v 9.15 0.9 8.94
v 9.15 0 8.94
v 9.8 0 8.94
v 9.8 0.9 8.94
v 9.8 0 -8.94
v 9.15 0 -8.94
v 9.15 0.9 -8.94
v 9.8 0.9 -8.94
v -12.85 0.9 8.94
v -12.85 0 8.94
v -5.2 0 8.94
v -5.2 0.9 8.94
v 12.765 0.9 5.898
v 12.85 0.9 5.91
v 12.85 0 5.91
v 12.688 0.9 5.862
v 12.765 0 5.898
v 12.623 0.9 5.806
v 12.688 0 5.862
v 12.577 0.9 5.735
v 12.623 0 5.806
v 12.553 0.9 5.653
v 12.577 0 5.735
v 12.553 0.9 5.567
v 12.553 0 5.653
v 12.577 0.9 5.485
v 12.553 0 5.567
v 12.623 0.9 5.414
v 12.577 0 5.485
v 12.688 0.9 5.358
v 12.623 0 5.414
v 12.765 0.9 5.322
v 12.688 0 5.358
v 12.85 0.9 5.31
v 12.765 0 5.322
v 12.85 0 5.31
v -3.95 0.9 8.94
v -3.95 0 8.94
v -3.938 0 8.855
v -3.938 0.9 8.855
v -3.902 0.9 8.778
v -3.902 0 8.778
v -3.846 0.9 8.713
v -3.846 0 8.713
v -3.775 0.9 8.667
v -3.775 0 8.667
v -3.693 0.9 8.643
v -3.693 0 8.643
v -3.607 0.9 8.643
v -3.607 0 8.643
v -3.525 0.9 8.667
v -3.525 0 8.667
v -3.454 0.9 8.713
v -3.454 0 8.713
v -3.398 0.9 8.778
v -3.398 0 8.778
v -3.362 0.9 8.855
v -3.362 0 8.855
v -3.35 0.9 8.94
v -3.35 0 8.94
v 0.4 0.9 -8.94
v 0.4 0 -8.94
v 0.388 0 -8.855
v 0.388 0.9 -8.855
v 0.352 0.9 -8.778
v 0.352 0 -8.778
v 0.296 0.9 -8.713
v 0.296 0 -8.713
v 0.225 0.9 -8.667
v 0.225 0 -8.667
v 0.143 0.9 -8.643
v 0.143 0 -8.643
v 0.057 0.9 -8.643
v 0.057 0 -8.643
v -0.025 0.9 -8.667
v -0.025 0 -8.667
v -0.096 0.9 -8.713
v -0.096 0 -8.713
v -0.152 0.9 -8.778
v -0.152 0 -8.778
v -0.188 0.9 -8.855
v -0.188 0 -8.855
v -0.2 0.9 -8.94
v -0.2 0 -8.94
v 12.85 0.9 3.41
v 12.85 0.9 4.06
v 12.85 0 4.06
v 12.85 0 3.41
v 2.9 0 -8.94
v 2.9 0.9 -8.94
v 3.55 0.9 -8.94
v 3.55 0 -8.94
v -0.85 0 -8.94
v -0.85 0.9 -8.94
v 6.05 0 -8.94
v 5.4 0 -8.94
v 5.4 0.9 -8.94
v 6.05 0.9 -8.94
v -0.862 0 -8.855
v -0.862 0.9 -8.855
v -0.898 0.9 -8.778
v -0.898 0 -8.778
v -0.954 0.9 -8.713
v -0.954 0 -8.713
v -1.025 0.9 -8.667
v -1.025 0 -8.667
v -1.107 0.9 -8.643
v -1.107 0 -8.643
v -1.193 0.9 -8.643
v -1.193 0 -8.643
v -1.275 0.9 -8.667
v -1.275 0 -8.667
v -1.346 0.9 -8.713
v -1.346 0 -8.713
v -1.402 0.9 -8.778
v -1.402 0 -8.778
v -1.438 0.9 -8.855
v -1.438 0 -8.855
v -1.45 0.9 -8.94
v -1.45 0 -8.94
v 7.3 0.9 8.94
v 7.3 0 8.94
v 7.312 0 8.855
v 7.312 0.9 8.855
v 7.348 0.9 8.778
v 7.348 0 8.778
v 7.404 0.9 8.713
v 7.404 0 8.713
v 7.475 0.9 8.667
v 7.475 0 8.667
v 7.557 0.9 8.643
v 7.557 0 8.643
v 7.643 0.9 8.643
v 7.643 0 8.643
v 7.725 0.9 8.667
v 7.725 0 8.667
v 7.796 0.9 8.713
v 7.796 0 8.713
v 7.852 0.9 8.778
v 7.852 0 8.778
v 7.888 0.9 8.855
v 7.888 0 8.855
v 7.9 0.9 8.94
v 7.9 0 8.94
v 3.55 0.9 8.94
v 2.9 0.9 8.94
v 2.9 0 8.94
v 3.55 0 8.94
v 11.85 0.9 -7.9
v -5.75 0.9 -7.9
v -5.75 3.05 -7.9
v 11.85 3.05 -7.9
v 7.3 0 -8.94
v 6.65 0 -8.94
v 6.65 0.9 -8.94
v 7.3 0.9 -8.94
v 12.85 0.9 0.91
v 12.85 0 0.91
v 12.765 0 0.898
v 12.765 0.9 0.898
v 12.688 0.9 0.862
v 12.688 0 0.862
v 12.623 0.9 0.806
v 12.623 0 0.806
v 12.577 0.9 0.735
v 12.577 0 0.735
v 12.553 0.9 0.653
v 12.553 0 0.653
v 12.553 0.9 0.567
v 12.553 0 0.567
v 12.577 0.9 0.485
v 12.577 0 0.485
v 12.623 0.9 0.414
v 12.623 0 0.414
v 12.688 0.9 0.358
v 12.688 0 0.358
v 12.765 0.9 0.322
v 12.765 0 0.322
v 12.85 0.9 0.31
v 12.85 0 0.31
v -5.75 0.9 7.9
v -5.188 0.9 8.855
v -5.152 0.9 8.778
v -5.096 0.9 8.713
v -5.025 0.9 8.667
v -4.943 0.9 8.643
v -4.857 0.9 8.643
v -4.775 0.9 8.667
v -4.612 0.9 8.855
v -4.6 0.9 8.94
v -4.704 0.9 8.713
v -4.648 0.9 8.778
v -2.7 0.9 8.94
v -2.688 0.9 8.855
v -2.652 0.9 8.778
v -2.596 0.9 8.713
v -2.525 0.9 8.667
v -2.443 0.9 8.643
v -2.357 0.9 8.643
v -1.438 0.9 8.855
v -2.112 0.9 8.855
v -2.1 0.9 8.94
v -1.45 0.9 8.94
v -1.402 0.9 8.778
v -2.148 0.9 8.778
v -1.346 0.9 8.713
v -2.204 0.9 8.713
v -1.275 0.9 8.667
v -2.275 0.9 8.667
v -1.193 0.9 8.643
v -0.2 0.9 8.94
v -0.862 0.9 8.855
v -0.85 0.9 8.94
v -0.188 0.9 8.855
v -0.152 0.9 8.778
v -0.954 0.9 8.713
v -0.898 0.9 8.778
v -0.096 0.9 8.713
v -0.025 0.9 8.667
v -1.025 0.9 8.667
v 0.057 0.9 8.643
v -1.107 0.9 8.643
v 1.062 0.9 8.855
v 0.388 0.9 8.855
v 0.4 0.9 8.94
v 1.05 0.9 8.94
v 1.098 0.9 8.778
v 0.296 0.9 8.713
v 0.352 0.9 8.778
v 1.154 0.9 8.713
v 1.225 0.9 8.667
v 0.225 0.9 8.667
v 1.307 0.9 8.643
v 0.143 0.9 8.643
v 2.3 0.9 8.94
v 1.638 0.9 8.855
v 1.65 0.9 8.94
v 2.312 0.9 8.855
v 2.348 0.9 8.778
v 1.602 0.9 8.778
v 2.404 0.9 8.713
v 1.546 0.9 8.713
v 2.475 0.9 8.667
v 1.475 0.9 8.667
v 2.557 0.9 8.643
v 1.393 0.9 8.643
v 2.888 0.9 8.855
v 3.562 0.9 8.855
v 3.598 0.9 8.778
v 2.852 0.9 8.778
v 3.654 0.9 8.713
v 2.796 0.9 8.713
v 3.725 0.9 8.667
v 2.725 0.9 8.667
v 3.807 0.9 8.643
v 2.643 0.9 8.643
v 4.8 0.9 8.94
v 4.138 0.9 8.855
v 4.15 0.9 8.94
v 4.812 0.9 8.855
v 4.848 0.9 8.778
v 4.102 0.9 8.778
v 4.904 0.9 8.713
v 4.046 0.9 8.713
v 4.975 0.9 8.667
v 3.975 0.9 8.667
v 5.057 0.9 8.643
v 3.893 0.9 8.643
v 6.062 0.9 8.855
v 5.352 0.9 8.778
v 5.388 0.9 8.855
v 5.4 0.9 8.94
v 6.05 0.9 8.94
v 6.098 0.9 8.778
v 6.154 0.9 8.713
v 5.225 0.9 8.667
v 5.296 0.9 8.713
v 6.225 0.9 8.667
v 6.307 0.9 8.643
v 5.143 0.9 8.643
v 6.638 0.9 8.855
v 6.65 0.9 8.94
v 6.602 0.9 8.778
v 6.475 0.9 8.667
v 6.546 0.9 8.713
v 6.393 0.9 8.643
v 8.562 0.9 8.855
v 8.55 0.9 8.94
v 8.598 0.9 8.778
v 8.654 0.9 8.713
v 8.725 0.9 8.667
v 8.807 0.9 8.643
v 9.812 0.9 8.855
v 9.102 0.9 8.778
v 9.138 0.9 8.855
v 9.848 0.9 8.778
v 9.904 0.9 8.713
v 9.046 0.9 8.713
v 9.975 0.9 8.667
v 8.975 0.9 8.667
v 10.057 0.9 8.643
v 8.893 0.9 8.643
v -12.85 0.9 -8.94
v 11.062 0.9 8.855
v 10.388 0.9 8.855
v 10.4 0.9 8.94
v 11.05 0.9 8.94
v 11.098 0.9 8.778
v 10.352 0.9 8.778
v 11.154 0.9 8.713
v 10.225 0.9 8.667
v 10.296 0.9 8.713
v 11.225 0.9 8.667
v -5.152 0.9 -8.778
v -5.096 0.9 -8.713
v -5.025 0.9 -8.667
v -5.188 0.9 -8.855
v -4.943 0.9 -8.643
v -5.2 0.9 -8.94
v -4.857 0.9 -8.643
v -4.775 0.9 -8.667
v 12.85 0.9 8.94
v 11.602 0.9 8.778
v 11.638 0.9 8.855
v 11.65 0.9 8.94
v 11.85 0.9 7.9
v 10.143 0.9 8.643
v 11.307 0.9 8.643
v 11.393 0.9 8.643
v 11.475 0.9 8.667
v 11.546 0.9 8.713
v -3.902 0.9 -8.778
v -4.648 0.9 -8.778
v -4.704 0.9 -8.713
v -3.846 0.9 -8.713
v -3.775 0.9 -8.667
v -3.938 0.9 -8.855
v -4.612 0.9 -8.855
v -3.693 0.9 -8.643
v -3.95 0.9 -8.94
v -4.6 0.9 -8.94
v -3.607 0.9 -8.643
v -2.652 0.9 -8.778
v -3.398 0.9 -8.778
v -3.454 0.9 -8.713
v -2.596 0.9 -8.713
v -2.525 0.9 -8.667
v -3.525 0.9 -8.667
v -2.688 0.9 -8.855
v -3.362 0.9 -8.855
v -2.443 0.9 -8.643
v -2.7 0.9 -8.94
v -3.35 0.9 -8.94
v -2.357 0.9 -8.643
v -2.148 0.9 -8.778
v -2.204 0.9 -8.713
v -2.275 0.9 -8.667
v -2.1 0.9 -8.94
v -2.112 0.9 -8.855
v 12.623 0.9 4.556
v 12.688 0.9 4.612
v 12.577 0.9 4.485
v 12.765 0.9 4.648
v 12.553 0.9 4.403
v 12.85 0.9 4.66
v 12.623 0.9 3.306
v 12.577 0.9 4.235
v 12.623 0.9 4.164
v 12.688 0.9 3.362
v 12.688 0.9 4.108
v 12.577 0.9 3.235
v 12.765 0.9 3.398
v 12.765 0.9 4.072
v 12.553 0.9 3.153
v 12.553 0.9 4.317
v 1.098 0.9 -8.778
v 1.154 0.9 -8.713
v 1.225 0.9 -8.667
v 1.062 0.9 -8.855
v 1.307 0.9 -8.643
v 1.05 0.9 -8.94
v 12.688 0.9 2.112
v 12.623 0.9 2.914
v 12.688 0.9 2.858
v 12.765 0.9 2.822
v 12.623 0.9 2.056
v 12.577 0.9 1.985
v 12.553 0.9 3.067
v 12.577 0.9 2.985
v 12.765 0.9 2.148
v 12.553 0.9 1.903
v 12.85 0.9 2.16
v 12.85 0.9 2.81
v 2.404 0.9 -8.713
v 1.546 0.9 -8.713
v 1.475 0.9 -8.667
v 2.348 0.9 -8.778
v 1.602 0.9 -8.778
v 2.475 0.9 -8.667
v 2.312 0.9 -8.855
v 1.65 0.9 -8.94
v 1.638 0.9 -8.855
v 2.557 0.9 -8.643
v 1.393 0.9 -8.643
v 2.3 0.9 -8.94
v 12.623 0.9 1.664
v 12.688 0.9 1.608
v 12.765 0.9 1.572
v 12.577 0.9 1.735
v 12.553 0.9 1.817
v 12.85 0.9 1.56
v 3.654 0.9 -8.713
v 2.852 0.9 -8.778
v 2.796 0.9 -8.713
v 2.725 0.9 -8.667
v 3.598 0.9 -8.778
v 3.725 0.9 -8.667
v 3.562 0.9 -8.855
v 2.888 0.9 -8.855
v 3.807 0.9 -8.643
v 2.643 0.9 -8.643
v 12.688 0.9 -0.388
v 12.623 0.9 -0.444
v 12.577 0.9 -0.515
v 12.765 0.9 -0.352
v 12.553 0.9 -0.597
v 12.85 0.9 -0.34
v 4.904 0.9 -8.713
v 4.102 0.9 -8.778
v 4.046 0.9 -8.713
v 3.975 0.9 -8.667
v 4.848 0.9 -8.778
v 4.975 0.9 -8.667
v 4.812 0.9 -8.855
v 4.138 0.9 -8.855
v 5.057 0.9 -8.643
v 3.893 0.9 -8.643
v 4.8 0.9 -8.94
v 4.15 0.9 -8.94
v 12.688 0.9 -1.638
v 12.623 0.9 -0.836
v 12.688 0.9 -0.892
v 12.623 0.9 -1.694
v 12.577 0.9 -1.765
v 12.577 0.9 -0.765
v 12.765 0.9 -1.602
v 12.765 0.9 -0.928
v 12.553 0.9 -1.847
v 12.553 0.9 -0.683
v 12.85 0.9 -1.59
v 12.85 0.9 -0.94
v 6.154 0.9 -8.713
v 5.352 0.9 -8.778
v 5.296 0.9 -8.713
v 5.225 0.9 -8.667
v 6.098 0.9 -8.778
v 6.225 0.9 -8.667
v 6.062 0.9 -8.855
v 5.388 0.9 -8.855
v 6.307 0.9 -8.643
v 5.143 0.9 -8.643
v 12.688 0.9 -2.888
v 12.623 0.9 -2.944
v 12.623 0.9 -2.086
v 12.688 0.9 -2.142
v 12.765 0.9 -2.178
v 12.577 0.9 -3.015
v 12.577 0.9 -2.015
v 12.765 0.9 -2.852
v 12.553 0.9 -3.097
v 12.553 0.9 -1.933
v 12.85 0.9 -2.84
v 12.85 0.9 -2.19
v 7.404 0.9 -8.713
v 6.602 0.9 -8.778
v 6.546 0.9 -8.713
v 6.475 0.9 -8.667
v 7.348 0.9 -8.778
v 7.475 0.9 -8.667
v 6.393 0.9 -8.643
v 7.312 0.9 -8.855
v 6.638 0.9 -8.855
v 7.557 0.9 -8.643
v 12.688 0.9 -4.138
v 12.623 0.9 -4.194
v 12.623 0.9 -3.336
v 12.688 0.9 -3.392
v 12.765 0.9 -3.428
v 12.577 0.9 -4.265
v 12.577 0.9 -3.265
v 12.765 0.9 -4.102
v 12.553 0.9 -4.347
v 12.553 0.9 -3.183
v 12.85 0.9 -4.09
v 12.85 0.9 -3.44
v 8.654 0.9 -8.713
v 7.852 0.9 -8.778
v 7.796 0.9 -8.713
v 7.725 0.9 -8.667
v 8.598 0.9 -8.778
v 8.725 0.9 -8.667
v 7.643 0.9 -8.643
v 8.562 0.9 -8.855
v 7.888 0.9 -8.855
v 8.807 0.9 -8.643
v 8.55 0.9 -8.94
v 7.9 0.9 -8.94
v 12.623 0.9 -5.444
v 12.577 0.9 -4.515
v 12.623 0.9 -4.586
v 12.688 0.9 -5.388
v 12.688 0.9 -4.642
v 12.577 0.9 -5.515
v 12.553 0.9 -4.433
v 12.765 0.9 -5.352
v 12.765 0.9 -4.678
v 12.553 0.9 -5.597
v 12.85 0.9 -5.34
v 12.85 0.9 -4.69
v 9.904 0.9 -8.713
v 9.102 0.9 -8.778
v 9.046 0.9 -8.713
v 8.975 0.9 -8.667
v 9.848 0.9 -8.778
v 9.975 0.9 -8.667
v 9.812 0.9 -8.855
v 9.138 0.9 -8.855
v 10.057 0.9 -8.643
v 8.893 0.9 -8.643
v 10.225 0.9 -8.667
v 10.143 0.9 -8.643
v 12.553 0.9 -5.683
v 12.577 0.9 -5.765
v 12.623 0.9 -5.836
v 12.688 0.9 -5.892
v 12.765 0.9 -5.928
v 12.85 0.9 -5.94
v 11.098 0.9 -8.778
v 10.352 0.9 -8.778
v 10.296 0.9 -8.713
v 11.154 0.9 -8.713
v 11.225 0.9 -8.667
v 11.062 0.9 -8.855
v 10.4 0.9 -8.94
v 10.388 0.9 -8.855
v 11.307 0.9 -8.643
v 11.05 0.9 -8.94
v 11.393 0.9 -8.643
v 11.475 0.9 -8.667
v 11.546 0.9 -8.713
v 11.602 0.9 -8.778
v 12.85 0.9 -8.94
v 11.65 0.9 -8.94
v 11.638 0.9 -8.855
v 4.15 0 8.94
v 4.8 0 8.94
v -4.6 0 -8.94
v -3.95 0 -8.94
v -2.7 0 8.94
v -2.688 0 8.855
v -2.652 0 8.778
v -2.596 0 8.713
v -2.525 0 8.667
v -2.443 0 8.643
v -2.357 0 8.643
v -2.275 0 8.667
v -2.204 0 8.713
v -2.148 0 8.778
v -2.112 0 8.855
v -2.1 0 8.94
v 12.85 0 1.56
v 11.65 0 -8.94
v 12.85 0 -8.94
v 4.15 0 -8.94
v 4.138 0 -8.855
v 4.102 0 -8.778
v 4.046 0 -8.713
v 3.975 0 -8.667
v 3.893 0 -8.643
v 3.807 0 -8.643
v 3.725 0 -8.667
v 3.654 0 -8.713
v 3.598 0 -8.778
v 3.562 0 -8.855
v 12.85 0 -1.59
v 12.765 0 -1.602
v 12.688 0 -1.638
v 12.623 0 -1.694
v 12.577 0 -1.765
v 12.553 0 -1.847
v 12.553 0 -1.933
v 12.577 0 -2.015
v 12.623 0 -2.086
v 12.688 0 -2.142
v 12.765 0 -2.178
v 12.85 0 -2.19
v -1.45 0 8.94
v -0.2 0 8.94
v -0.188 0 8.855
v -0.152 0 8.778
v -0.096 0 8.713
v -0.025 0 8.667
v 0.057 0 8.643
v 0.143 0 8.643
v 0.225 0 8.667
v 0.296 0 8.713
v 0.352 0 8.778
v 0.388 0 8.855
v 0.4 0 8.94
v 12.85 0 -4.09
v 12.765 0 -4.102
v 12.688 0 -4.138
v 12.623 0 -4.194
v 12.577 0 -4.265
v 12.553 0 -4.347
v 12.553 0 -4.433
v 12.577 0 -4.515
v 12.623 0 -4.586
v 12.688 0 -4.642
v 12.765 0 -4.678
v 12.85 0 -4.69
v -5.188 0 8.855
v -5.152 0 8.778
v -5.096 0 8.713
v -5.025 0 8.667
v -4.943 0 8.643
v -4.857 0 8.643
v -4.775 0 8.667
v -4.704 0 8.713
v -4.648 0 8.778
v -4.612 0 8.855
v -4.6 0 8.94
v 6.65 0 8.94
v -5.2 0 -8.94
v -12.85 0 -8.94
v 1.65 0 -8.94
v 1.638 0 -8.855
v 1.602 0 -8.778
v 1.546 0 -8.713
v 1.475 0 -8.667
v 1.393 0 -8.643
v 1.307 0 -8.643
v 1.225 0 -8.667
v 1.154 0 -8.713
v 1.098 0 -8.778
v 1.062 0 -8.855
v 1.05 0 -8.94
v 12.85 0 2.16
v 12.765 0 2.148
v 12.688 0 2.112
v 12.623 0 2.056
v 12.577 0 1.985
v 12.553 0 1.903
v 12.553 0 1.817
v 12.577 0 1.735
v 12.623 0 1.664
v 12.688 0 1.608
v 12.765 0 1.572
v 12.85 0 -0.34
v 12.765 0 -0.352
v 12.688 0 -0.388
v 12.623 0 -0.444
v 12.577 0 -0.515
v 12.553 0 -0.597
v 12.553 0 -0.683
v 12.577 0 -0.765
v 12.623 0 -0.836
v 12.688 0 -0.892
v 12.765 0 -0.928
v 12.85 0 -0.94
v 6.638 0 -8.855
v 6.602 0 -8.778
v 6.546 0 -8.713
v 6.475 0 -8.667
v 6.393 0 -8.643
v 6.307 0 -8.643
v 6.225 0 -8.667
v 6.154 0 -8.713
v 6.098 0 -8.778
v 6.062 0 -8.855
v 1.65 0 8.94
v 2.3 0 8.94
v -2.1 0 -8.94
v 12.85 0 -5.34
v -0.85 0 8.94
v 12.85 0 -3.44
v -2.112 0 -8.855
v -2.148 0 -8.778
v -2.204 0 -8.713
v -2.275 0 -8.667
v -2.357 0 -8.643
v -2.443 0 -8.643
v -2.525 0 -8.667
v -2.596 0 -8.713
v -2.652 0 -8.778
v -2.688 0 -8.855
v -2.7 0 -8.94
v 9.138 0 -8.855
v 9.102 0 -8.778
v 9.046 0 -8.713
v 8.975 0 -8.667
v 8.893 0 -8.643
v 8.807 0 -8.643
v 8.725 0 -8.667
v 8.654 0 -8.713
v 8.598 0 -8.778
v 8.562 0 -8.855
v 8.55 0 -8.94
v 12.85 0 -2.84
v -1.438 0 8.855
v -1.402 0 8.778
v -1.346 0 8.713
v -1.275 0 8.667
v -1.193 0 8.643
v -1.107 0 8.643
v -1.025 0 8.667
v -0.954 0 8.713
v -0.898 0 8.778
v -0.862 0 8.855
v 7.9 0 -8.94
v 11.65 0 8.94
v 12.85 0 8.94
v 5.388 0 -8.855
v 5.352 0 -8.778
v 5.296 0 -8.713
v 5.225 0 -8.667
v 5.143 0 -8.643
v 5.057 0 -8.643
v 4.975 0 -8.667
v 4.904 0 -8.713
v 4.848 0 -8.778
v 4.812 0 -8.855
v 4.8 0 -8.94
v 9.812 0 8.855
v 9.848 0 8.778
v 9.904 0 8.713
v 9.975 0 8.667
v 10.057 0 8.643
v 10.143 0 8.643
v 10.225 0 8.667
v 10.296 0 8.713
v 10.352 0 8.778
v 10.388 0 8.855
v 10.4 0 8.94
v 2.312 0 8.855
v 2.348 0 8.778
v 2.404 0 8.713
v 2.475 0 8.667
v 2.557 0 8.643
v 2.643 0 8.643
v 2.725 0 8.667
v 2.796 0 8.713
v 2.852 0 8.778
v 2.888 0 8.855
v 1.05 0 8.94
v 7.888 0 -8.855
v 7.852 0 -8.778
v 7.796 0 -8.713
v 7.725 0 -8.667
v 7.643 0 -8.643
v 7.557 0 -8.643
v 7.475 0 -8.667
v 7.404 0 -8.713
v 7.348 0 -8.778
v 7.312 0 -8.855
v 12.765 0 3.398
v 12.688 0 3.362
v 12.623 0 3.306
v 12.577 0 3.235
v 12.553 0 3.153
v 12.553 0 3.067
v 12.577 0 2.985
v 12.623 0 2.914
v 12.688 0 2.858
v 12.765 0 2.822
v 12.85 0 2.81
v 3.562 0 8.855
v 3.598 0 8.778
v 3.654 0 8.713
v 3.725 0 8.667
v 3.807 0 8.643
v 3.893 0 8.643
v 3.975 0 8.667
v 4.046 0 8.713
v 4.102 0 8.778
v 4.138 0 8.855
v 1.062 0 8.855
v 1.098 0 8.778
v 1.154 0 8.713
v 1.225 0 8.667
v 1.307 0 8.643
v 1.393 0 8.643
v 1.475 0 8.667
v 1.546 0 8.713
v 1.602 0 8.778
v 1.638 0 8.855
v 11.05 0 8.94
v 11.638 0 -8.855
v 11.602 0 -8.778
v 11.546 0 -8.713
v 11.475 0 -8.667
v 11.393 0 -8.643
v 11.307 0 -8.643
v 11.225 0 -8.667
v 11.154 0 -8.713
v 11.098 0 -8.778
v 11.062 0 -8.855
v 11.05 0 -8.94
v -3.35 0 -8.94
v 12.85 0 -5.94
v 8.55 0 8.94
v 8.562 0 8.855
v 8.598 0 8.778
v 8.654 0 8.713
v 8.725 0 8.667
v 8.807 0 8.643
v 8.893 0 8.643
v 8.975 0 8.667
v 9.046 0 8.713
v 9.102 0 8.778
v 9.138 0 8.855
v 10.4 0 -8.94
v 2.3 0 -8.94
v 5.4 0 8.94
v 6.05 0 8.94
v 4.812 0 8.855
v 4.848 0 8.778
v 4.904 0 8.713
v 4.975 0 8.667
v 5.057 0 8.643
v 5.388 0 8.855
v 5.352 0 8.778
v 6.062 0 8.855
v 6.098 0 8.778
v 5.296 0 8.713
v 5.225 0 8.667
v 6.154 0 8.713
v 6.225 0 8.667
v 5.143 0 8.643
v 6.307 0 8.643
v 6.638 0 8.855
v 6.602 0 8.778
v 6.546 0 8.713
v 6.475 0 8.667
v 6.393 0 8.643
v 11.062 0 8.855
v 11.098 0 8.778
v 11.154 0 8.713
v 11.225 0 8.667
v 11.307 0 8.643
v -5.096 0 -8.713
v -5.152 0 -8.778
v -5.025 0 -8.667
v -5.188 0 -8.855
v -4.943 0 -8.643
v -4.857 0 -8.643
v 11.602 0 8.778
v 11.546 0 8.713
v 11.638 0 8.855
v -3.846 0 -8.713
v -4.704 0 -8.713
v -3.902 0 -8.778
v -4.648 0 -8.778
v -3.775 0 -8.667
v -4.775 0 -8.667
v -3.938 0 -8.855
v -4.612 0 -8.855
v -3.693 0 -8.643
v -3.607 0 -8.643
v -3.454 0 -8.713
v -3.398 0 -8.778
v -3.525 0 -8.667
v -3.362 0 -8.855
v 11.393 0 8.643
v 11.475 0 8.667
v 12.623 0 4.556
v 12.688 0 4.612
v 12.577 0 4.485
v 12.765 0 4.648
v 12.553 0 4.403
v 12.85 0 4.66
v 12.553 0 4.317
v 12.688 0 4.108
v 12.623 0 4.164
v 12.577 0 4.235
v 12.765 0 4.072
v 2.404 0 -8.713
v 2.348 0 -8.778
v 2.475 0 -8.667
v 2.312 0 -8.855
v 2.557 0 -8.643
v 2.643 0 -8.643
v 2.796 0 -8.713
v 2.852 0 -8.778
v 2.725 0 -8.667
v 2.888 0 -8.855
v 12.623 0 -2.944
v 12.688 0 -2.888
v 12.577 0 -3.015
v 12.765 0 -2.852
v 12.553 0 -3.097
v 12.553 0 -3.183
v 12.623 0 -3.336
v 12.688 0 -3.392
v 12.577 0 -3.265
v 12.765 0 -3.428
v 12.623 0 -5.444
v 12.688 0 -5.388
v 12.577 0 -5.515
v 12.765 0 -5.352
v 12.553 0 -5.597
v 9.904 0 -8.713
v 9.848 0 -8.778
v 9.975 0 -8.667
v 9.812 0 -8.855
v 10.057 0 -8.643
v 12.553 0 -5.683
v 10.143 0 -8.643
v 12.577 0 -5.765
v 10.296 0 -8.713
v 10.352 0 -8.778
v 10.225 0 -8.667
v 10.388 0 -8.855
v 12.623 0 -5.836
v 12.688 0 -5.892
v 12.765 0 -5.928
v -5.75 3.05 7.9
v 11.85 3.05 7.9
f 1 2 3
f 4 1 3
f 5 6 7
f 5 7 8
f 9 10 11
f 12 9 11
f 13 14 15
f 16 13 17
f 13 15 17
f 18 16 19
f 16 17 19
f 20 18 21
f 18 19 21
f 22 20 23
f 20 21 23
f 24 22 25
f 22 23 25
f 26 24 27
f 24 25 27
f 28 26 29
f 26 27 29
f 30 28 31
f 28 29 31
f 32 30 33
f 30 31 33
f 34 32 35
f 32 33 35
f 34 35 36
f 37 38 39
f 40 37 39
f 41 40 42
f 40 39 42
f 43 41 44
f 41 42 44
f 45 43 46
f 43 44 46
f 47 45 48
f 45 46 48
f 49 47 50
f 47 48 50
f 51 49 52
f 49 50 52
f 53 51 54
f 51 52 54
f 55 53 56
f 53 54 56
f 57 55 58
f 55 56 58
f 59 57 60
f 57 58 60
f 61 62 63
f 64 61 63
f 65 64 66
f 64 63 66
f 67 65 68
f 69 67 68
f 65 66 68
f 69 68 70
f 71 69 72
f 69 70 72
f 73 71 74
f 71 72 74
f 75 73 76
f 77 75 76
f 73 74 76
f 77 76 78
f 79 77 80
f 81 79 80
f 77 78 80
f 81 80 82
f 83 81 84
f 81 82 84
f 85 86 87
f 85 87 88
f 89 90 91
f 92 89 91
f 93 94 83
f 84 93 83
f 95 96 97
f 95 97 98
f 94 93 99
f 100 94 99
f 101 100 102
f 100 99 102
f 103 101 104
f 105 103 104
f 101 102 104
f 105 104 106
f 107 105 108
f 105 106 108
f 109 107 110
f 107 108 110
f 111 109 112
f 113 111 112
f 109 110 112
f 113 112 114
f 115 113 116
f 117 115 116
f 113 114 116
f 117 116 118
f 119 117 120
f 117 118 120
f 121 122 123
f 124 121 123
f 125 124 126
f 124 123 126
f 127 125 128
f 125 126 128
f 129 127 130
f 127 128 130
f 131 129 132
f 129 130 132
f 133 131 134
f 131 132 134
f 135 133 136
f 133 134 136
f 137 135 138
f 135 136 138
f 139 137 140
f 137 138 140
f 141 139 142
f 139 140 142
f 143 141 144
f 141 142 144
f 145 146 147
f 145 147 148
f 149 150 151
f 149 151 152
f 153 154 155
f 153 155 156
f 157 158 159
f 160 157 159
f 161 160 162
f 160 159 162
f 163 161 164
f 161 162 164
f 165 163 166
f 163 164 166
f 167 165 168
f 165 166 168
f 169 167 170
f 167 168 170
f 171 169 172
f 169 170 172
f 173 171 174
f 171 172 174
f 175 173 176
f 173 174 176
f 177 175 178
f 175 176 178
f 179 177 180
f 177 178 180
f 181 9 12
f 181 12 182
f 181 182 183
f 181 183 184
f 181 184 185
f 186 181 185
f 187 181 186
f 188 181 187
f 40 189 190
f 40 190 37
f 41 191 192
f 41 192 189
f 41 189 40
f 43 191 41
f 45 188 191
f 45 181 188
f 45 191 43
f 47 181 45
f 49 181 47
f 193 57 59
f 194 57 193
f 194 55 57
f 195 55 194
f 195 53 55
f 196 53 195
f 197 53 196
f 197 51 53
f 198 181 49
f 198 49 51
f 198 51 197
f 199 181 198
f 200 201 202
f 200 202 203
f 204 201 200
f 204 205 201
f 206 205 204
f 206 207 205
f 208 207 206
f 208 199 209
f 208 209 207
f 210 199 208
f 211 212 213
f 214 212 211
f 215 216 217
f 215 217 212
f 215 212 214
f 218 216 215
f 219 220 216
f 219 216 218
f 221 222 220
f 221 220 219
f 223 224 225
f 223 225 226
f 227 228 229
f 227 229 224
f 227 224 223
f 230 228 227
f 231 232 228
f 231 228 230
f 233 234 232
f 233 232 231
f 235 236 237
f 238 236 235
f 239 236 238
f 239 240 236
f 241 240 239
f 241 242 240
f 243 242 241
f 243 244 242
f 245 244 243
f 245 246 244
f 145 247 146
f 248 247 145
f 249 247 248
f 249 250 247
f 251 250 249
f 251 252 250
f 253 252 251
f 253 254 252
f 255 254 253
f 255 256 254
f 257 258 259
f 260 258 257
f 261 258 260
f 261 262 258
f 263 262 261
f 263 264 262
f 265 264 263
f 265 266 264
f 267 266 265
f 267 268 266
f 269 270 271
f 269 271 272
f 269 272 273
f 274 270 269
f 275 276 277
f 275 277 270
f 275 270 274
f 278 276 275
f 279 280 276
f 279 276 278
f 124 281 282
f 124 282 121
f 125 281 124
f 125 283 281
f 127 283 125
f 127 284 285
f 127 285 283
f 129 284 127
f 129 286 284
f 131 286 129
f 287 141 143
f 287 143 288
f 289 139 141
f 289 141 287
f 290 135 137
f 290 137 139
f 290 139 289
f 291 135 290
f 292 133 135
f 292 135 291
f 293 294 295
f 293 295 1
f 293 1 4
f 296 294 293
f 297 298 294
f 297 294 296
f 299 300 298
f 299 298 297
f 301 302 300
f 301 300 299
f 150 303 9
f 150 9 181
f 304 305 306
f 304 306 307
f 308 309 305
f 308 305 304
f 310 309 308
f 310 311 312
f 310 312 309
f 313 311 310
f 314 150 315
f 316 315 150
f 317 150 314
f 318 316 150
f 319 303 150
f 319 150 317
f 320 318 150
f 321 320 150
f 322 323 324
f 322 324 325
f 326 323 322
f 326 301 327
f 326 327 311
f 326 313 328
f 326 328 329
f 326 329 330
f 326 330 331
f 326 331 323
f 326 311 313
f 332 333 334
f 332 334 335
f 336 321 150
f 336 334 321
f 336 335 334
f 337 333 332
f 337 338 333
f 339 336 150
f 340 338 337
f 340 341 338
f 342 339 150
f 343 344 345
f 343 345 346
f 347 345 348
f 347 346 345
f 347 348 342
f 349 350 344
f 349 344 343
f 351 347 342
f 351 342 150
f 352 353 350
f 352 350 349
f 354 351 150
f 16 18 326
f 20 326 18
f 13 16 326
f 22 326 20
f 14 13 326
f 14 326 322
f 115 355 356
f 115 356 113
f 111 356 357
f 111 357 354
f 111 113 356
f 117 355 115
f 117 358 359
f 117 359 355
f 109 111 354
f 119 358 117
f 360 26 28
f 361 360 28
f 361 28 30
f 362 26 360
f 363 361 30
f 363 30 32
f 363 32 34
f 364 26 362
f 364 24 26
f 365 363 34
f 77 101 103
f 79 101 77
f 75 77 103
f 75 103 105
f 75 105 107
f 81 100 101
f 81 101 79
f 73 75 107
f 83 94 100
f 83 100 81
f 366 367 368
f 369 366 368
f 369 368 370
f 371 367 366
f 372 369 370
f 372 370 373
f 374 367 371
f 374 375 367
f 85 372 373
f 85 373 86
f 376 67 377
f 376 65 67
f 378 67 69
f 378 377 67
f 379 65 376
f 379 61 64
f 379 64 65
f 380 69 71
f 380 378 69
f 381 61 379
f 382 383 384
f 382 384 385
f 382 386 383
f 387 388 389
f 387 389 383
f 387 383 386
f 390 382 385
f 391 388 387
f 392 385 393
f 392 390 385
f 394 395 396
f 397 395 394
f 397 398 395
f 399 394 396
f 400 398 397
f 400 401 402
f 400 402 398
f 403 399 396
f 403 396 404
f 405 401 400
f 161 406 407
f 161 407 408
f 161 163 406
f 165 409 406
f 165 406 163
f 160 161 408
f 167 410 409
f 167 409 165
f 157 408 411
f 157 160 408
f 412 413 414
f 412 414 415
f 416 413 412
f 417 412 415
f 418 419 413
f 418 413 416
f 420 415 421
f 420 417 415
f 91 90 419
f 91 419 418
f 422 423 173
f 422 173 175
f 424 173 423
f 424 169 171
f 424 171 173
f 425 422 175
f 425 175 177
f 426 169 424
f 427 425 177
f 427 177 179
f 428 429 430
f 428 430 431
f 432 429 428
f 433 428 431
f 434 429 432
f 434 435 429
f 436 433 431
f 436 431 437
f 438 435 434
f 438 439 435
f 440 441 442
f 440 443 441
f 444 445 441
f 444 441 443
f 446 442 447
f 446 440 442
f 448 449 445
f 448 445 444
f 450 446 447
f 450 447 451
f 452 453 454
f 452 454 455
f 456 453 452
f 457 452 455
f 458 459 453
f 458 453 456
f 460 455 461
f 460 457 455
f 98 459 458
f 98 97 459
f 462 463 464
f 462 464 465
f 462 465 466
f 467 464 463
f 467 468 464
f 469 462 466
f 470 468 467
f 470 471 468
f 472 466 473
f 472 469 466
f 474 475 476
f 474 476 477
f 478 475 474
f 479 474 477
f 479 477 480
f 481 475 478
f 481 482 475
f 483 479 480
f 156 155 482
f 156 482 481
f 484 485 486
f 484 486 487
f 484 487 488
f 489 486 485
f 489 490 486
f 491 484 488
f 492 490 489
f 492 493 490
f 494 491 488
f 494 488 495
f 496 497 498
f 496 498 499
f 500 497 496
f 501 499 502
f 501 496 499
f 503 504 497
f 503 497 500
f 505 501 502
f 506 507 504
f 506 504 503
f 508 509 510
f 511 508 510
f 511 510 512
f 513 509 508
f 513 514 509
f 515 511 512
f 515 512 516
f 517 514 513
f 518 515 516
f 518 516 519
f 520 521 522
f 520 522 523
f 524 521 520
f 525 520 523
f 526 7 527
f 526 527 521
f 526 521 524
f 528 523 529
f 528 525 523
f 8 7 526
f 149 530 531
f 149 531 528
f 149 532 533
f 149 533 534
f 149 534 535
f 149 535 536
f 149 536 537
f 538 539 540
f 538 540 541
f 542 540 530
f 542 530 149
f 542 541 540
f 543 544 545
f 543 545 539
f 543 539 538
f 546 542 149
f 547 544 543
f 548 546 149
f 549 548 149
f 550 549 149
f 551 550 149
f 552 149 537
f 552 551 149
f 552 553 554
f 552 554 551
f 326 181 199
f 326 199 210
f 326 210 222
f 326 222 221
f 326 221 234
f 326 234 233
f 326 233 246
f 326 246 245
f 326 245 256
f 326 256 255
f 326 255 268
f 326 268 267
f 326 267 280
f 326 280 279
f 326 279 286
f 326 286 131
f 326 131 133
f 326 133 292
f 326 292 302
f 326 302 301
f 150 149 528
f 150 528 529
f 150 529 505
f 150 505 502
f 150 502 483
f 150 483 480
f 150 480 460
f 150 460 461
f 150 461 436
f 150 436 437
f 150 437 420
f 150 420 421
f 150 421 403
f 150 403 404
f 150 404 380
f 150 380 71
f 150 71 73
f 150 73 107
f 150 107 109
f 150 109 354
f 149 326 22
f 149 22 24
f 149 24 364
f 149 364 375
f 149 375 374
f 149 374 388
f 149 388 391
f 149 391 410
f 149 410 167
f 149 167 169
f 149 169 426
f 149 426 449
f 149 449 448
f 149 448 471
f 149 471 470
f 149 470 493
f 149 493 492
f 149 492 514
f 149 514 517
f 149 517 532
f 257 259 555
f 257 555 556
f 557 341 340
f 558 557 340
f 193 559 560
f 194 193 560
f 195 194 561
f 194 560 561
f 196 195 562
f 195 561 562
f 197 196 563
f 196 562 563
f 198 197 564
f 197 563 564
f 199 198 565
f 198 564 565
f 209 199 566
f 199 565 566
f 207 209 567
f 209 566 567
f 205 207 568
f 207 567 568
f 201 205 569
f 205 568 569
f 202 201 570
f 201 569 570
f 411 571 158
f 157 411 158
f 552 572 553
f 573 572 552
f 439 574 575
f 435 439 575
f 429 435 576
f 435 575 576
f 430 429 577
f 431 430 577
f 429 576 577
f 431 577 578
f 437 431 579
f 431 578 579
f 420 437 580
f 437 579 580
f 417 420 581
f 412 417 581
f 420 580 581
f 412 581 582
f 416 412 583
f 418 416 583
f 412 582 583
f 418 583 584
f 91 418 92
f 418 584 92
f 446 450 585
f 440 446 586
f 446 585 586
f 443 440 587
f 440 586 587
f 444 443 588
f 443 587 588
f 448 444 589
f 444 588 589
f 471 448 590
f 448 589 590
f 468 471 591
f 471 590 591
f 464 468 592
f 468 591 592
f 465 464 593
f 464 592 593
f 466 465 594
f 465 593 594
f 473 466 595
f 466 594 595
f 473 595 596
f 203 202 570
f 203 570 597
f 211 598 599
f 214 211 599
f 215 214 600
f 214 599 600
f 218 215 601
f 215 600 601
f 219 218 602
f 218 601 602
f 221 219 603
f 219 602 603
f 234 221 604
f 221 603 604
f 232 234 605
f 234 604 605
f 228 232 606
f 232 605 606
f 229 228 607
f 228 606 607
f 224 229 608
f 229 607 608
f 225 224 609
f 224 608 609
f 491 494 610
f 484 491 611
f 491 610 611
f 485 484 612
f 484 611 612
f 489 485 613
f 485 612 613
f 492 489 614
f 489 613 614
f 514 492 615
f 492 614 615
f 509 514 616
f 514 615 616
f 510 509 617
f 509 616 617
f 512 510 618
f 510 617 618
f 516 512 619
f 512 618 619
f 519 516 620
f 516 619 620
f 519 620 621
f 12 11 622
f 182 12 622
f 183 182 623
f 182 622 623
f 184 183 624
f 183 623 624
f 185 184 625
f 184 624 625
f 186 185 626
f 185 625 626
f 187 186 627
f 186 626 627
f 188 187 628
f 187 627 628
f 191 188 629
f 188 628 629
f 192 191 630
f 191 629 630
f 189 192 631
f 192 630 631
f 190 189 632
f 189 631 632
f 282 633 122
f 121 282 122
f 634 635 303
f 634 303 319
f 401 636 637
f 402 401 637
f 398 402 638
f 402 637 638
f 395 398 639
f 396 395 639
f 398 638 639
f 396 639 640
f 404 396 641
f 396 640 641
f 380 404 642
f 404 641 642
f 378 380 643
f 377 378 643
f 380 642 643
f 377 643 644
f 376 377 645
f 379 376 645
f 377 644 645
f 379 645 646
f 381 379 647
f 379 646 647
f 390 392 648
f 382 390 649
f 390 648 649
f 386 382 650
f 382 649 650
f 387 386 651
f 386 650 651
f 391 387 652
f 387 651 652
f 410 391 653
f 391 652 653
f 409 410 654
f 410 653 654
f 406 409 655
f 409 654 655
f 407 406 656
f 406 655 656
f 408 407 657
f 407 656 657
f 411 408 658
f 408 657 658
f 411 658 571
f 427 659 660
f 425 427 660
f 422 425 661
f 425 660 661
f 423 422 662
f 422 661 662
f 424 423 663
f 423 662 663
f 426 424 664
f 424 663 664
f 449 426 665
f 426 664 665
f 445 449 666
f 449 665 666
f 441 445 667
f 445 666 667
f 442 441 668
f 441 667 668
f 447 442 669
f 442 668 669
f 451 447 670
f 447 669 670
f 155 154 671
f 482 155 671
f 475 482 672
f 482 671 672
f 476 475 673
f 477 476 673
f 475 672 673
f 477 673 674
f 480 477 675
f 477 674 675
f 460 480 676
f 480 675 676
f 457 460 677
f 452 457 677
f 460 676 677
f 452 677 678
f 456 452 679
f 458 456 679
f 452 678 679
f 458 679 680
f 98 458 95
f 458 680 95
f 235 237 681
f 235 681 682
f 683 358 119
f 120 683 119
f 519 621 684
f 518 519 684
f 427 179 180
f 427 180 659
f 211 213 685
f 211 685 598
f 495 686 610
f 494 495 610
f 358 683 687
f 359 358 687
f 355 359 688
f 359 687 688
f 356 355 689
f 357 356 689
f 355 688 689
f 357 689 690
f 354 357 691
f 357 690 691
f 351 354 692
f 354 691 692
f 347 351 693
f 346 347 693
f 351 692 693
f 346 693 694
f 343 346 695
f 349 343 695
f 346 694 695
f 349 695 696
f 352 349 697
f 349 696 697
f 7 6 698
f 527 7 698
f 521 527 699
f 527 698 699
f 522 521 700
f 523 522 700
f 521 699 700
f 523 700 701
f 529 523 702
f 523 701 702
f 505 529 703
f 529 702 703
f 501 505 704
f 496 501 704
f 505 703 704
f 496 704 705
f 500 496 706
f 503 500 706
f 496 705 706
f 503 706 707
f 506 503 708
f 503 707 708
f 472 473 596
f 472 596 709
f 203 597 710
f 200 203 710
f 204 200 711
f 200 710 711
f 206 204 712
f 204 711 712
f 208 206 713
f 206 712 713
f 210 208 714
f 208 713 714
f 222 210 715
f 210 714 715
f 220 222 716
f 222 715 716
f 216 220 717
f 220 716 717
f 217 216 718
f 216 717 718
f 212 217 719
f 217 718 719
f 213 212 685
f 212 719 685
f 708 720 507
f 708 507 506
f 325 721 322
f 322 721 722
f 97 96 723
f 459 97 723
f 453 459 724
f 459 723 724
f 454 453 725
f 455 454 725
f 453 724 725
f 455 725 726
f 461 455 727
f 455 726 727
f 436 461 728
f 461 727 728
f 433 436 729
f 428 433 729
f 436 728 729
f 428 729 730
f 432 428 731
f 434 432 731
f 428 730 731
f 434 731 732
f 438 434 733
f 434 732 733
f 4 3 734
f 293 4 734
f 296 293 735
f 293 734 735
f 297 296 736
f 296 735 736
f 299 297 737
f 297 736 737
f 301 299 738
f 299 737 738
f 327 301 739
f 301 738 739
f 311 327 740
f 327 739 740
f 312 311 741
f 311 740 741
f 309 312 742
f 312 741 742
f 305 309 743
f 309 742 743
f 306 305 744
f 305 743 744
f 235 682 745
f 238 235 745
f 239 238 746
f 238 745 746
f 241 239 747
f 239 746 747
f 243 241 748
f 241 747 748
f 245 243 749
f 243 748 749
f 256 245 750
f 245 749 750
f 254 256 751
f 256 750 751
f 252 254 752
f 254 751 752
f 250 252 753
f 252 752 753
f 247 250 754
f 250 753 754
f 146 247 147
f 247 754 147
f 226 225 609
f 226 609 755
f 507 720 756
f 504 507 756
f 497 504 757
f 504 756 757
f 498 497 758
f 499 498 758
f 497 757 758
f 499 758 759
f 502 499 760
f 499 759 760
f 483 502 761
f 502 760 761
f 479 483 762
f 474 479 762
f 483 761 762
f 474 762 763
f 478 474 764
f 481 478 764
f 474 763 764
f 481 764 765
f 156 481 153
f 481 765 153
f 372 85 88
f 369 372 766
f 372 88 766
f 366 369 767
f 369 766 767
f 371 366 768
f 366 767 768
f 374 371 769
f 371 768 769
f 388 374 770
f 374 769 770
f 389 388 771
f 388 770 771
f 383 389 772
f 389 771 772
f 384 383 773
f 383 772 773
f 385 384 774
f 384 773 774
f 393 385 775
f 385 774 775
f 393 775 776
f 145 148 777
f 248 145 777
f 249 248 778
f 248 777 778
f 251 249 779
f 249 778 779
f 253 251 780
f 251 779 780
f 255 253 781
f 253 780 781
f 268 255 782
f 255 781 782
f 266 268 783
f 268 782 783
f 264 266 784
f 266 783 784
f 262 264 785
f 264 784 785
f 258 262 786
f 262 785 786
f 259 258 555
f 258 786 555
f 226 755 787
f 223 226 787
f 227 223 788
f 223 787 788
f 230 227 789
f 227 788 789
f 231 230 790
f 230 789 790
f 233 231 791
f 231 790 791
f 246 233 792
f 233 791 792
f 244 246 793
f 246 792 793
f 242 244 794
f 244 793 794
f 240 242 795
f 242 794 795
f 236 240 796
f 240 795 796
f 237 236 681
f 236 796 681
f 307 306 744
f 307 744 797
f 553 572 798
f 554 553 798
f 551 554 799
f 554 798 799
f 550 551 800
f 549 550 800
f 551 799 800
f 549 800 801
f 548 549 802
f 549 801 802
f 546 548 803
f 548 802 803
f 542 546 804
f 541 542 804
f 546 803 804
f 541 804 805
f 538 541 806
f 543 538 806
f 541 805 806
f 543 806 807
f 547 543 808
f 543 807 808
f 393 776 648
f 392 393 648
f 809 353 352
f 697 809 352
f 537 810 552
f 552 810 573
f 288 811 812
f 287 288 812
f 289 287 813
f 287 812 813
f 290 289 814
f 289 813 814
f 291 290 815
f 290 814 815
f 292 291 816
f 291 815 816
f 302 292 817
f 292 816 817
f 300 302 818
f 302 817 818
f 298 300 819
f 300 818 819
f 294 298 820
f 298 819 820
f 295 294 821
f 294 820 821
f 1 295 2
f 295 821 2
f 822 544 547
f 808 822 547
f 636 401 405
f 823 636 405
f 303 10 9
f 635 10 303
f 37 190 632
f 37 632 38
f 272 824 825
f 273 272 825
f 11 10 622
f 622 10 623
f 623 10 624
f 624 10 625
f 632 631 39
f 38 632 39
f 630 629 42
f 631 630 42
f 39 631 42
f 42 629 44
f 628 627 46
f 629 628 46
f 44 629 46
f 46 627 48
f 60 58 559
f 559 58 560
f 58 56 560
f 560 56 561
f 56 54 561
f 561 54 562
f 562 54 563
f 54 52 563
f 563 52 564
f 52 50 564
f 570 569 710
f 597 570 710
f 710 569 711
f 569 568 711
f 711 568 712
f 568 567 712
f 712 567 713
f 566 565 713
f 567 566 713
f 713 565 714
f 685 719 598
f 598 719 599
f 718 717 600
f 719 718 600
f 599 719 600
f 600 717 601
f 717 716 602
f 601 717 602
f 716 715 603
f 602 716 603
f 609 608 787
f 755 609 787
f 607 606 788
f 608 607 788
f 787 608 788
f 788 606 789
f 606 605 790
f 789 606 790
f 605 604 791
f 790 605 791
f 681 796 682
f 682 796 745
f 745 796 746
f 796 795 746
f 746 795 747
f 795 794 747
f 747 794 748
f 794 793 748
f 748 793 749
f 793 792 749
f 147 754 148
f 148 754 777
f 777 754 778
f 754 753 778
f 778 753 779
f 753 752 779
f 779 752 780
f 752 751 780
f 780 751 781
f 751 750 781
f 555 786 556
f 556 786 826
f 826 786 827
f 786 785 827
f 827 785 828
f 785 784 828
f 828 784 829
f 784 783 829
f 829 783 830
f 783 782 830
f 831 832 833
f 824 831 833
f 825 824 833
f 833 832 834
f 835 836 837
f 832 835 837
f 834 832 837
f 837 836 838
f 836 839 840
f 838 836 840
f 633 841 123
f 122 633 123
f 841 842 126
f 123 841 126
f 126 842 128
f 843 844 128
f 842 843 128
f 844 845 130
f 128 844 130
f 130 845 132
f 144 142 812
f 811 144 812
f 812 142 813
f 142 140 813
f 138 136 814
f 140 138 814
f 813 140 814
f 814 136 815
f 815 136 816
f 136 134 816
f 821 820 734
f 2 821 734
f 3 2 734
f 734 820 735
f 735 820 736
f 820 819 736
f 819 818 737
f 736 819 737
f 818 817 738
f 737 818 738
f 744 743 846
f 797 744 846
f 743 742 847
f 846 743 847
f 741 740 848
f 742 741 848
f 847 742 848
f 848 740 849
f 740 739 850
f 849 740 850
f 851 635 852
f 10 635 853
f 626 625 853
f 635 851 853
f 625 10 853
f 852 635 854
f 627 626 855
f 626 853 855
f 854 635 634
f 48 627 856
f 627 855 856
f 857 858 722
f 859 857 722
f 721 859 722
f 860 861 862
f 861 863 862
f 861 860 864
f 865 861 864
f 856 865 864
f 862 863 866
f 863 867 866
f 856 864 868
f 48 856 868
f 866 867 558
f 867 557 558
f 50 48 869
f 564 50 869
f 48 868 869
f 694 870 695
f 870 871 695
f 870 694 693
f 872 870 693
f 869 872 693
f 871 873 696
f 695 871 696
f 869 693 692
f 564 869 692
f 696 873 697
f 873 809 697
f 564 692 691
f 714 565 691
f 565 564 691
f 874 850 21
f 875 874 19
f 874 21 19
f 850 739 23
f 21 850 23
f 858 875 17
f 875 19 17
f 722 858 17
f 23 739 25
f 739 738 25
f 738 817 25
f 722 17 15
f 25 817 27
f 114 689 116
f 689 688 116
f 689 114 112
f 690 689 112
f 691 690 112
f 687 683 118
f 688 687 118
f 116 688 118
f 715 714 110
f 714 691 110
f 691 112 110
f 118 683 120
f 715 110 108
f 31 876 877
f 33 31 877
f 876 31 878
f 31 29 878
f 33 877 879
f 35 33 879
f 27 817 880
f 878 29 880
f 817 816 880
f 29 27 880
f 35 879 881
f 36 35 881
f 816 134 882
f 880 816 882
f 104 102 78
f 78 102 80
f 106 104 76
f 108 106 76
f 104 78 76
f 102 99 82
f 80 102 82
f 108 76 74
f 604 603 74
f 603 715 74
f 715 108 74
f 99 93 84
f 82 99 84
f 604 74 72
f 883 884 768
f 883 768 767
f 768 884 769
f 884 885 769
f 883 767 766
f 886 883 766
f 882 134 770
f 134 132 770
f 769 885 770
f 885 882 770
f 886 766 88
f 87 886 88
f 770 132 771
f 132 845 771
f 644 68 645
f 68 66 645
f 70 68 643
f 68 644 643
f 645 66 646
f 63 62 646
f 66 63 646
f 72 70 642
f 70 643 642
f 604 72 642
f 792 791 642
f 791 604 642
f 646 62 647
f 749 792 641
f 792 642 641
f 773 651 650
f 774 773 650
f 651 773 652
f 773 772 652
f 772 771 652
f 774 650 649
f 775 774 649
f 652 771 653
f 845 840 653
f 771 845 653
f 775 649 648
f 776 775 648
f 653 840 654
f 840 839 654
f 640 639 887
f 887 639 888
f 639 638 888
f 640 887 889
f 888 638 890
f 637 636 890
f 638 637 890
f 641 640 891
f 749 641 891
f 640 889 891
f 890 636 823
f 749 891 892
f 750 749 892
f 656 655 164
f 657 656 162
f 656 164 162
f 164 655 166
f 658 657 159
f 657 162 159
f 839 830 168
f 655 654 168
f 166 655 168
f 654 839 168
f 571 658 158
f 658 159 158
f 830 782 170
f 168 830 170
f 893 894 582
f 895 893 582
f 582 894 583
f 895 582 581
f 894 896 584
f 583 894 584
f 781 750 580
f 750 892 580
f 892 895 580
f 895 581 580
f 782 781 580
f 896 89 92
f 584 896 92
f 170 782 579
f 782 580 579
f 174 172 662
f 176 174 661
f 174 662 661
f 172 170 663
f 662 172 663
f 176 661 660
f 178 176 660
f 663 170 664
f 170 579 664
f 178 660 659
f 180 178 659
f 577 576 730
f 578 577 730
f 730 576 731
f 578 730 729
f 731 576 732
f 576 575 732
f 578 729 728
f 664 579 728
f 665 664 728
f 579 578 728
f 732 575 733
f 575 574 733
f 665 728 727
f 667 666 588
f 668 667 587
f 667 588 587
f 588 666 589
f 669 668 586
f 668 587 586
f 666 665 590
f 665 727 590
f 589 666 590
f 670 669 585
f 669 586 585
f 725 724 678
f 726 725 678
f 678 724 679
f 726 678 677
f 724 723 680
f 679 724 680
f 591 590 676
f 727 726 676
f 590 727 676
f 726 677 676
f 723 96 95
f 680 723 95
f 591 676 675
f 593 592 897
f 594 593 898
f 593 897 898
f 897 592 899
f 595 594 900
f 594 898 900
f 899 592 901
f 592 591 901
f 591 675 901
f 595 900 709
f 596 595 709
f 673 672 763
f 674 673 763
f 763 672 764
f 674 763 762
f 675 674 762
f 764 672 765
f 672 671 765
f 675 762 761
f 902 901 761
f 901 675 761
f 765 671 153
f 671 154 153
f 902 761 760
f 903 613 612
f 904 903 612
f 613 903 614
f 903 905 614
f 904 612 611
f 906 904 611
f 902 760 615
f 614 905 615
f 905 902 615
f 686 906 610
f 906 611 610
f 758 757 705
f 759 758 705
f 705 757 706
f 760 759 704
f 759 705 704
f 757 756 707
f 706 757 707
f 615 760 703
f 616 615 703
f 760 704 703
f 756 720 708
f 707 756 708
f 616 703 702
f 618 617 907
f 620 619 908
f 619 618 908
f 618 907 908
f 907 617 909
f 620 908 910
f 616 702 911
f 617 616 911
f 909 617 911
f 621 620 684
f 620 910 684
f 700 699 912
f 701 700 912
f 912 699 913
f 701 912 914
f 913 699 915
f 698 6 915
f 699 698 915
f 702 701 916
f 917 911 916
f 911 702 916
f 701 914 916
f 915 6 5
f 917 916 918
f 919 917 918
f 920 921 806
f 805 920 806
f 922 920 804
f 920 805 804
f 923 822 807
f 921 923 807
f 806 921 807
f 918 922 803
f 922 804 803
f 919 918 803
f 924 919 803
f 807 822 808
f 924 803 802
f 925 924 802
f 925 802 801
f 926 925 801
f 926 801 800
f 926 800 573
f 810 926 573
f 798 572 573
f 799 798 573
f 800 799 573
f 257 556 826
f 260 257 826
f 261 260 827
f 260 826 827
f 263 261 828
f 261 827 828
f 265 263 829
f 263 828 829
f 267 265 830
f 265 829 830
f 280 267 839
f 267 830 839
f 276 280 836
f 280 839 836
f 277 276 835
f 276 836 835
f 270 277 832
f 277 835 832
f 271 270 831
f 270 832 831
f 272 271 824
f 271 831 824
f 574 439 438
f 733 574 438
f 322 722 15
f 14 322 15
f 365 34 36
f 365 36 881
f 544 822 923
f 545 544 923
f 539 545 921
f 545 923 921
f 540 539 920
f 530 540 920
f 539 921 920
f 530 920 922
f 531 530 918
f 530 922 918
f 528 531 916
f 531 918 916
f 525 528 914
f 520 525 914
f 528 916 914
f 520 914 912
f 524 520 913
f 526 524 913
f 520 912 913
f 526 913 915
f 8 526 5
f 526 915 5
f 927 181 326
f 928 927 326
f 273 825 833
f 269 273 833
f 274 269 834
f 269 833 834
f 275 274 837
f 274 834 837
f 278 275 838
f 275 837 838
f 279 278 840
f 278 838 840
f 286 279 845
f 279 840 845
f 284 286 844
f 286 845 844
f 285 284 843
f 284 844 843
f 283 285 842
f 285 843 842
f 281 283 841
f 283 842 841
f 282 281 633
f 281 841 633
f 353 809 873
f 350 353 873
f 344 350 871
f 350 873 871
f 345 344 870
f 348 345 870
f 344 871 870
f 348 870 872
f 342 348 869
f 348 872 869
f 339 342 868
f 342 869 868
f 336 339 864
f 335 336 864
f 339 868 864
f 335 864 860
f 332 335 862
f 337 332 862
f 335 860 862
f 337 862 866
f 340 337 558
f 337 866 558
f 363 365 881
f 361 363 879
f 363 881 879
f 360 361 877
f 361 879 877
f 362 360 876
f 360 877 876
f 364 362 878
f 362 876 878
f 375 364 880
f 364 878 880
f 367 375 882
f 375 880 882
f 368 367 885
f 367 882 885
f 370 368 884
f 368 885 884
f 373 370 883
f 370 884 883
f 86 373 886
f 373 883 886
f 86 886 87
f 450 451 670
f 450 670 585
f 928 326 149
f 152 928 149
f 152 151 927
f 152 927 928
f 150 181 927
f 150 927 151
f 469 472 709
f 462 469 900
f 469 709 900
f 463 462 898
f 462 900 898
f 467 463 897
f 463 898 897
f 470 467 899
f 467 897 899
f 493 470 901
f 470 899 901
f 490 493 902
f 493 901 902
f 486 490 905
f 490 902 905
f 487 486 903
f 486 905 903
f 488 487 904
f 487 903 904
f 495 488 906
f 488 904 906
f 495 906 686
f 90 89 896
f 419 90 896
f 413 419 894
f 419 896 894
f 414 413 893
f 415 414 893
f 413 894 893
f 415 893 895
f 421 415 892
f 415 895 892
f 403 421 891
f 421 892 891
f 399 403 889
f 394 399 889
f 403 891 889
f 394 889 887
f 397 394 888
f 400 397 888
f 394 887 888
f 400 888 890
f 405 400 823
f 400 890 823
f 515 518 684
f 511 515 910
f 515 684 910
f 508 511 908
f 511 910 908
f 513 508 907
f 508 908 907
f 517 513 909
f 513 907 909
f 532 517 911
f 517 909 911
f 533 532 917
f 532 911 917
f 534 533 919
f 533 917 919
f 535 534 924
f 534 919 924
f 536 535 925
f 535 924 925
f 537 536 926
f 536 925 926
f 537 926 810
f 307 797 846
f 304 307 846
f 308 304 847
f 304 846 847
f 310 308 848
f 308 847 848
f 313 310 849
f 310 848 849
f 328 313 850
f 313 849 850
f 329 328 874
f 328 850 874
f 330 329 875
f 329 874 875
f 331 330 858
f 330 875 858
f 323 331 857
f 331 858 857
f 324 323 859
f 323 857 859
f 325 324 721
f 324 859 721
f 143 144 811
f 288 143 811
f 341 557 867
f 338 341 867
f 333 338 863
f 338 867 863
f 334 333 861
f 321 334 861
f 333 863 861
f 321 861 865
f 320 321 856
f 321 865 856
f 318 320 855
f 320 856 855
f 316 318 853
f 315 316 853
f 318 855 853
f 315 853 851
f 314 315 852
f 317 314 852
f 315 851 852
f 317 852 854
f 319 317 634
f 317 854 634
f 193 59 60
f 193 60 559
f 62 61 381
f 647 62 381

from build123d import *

# Parameters (mm, degrees)
SKETCH2_W             = 25.7
SKETCH2_H             = 17.88
BOSS_EXTRUDE1_DEPTH   = 0.9
SKETCH3_W             = 17.6
SKETCH3_H             = 15.8
BOSS_EXTRUDE2_DEPTH   = 2.15
F_1_5MM_DOWEL_HOLE1_D = 0.6


with BuildPart() as part:
    # Sketch2 → Boss-Extrude1 (new body)
    with BuildSketch(Plane(origin=(0, 0, 0), x_dir=(1, 0, 0), z_dir=(0, 1, 0))):
        Rectangle(SKETCH2_W, SKETCH2_H)
    extrude(amount=BOSS_EXTRUDE1_DEPTH)

    # Sketch3 → Boss-Extrude2 (add)
    with BuildSketch(Plane(origin=(0, 0.9, 0), x_dir=(1, 0, 0), z_dir=(0, 1, 0))):
        with Locations((3.05, 0)):
            Rectangle(SKETCH3_W, SKETCH3_H)
    extrude(amount=BOSS_EXTRUDE2_DEPTH)

    # Ø1.5mm Dowel Hole1 (through all)
    with Locations(Plane(origin=(0, 3.05, 0), x_dir=(1, 0, 0), z_dir=(0, 1, 0))):
        with Locations((11.35, 8.94), (10.1, 8.94), (8.85, 8.94), (7.6, 8.94), (6.35, 8.94), (5.1, 8.94), (3.85, 8.94), (2.6, 8.94), (1.35, 8.94), (0.1, 8.94), (-1.15, 8.94), (-2.4, 8.94), (-3.65, 8.94), (-4.9, 8.94), (11.35, -8.94), (10.1, -8.94), (8.85, -8.94), (7.6, -8.94), (6.35, -8.94), (5.1, -8.94), (3.85, -8.94), (2.6, -8.94), (1.35, -8.94), (0.1, -8.94), (-1.15, -8.94), (-2.4, -8.94), (-3.65, -8.94), (-4.9, -8.94), (12.85, 5.64), (12.85, 4.39), (12.85, 3.14), (12.85, 1.89), (12.85, 0.64), (12.85, -0.61), (12.85, -1.86), (12.85, -3.11), (12.85, -4.36), (12.85, -5.61)):
            Hole(F_1_5MM_DOWEL_HOLE1_D / 2)


solid = part.part
